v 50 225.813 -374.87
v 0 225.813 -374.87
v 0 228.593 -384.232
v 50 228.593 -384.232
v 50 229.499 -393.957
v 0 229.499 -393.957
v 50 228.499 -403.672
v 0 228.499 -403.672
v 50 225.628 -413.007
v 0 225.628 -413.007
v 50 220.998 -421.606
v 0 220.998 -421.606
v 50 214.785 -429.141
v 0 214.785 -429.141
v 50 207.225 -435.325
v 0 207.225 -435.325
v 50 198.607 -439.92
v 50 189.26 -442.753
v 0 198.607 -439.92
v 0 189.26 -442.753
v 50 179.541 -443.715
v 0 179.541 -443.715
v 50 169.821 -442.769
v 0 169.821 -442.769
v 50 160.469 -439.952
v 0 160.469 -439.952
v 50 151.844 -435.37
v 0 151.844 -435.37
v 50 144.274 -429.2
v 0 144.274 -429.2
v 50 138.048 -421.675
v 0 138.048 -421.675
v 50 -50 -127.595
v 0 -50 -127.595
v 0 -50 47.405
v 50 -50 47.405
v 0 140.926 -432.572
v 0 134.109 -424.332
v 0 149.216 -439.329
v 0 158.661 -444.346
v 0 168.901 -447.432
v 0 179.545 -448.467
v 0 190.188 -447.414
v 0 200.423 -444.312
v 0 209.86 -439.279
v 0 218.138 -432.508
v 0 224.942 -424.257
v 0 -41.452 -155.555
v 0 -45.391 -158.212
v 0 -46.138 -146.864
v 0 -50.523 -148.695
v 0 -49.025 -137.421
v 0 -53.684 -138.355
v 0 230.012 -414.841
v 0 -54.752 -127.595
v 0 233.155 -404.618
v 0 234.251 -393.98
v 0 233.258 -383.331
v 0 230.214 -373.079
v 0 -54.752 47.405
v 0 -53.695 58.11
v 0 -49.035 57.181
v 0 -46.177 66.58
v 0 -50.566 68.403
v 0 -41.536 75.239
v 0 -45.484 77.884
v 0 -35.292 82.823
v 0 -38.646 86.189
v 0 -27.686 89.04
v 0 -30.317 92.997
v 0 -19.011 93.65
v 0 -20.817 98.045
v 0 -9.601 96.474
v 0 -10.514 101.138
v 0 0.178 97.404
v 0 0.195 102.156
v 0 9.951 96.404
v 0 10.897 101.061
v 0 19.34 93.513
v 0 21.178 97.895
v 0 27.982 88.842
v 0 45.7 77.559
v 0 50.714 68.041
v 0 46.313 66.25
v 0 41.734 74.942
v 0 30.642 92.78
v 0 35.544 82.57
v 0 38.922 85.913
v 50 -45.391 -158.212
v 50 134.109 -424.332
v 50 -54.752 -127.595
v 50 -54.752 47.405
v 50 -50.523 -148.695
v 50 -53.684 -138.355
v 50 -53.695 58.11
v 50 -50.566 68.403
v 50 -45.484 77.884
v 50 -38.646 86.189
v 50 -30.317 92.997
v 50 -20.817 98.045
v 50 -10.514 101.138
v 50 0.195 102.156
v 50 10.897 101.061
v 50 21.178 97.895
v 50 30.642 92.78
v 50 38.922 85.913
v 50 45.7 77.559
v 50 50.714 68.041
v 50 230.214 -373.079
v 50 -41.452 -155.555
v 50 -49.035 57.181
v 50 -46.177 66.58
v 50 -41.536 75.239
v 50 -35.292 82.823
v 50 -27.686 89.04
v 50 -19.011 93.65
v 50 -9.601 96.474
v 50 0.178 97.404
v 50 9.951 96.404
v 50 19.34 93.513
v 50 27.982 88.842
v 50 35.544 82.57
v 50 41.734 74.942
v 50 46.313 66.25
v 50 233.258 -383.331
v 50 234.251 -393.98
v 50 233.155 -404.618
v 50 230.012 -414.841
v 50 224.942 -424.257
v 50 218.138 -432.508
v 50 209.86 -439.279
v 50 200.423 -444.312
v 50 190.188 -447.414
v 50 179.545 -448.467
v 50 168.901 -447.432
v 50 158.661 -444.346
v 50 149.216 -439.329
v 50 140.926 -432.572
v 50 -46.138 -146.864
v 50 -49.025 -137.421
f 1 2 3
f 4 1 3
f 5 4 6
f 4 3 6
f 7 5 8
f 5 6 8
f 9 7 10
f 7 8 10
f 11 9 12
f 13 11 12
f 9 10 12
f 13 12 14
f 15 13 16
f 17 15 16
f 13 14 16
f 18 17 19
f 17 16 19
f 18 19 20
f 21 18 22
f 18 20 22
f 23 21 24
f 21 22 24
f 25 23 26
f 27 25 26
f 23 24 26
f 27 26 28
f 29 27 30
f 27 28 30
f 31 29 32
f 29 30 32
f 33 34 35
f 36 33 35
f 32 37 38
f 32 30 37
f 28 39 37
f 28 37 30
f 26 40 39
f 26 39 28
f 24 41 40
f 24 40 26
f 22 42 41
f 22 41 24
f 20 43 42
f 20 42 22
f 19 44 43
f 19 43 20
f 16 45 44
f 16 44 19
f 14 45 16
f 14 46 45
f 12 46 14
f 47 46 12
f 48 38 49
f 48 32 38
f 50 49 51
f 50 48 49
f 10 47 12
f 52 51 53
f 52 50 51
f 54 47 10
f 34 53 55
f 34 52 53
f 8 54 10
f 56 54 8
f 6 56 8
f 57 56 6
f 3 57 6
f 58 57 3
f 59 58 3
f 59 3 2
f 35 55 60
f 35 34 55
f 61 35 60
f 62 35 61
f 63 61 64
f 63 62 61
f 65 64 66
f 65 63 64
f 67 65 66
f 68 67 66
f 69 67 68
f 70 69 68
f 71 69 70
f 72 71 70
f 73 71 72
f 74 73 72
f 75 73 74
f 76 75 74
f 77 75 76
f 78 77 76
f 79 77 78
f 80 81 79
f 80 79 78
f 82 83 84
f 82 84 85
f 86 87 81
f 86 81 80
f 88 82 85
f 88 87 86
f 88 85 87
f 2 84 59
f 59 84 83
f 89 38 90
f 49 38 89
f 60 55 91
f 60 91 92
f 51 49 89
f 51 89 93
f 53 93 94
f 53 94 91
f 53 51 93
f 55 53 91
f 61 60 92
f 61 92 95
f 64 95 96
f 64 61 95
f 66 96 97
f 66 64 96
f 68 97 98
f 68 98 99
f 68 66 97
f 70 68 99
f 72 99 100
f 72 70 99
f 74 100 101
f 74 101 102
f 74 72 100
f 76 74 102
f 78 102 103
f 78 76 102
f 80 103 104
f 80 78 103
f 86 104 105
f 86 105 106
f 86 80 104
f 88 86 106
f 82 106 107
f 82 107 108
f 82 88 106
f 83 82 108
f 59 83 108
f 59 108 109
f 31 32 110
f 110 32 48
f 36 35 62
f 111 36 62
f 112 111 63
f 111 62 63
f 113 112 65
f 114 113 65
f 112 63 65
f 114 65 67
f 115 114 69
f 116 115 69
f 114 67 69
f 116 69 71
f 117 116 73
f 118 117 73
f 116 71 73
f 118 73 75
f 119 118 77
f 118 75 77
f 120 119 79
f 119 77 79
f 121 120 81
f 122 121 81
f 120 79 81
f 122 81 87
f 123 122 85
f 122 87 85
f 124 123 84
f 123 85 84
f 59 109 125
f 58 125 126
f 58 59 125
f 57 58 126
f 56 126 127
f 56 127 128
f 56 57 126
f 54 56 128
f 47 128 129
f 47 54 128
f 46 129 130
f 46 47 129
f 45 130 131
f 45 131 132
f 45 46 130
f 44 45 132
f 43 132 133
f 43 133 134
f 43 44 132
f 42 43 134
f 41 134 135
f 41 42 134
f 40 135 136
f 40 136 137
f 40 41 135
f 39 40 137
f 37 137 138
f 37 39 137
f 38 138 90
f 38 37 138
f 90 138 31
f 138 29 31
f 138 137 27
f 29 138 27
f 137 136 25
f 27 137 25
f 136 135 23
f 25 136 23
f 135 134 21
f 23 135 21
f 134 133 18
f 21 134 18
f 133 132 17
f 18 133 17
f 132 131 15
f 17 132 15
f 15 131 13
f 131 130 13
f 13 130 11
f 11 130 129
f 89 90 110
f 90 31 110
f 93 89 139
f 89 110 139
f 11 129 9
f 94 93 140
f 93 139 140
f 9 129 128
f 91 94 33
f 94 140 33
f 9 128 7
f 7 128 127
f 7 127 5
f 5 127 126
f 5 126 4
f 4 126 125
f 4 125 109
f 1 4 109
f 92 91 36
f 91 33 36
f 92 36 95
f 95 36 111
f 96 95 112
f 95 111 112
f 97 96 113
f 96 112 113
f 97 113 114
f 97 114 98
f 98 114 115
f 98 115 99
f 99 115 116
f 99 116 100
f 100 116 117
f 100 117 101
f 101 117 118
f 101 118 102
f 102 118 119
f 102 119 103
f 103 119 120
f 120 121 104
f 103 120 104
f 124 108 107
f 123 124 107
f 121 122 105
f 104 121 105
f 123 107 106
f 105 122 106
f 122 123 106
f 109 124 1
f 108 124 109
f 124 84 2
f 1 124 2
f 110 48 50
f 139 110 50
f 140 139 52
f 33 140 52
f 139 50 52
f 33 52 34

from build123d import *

# Parameters (mm, degrees)
EXTRUDE_1_DEPTH = 50


with BuildPart() as part:
    # 스케치1 → 보스-돌출1 (new body)
    with BuildSketch(Plane(origin=(0, 0, 0), x_dir=(0, 0, -1), z_dir=(1, 0, 0))):
        with BuildLine():
            Line((-68.041278197, 50.714063441), (373.078721803, 230.214063441))
            ThreePointArc((373.078721803, 230.214063441), (442.026414912, 205.264519299), (424.332130863, 134.108518499))
            Line((424.332130863, 134.108518499), (158.212130863, -45.391481501))
            ThreePointArc((158.212130863, -45.391481501), (143.603146836, -52.359602267), (127.595225221, -54.752))
            Line((127.595225221, -54.752), (-47.404774779, -54.752))
            ThreePointArc((-47.404774779, -54.752), (-101.137808871, -10.513921782), (-68.041278197, 50.714063441))
        make_face()
        with BuildLine():
            Line((-66.250208204, 46.312521406), (374.869791796, 225.812521406))
            ThreePointArc((374.869791796, 225.812521406), (437.833421534, 203.028381884), (421.674848287, 138.048106461))
            Line((421.674848287, 138.048106461), (155.554848287, -41.451893539))
            ThreePointArc((155.554848287, -41.451893539), (142.213797707, -47.815241696), (127.595225221, -50))
            Line((127.595225221, -50), (-47.404774779, -50))
            ThreePointArc((-47.404774779, -50), (-96.474246298, -9.601404316), (-66.250208204, 46.312521406))
        make_face(mode=Mode.SUBTRACT)
    extrude(amount=EXTRUDE_1_DEPTH)


solid = part.part
